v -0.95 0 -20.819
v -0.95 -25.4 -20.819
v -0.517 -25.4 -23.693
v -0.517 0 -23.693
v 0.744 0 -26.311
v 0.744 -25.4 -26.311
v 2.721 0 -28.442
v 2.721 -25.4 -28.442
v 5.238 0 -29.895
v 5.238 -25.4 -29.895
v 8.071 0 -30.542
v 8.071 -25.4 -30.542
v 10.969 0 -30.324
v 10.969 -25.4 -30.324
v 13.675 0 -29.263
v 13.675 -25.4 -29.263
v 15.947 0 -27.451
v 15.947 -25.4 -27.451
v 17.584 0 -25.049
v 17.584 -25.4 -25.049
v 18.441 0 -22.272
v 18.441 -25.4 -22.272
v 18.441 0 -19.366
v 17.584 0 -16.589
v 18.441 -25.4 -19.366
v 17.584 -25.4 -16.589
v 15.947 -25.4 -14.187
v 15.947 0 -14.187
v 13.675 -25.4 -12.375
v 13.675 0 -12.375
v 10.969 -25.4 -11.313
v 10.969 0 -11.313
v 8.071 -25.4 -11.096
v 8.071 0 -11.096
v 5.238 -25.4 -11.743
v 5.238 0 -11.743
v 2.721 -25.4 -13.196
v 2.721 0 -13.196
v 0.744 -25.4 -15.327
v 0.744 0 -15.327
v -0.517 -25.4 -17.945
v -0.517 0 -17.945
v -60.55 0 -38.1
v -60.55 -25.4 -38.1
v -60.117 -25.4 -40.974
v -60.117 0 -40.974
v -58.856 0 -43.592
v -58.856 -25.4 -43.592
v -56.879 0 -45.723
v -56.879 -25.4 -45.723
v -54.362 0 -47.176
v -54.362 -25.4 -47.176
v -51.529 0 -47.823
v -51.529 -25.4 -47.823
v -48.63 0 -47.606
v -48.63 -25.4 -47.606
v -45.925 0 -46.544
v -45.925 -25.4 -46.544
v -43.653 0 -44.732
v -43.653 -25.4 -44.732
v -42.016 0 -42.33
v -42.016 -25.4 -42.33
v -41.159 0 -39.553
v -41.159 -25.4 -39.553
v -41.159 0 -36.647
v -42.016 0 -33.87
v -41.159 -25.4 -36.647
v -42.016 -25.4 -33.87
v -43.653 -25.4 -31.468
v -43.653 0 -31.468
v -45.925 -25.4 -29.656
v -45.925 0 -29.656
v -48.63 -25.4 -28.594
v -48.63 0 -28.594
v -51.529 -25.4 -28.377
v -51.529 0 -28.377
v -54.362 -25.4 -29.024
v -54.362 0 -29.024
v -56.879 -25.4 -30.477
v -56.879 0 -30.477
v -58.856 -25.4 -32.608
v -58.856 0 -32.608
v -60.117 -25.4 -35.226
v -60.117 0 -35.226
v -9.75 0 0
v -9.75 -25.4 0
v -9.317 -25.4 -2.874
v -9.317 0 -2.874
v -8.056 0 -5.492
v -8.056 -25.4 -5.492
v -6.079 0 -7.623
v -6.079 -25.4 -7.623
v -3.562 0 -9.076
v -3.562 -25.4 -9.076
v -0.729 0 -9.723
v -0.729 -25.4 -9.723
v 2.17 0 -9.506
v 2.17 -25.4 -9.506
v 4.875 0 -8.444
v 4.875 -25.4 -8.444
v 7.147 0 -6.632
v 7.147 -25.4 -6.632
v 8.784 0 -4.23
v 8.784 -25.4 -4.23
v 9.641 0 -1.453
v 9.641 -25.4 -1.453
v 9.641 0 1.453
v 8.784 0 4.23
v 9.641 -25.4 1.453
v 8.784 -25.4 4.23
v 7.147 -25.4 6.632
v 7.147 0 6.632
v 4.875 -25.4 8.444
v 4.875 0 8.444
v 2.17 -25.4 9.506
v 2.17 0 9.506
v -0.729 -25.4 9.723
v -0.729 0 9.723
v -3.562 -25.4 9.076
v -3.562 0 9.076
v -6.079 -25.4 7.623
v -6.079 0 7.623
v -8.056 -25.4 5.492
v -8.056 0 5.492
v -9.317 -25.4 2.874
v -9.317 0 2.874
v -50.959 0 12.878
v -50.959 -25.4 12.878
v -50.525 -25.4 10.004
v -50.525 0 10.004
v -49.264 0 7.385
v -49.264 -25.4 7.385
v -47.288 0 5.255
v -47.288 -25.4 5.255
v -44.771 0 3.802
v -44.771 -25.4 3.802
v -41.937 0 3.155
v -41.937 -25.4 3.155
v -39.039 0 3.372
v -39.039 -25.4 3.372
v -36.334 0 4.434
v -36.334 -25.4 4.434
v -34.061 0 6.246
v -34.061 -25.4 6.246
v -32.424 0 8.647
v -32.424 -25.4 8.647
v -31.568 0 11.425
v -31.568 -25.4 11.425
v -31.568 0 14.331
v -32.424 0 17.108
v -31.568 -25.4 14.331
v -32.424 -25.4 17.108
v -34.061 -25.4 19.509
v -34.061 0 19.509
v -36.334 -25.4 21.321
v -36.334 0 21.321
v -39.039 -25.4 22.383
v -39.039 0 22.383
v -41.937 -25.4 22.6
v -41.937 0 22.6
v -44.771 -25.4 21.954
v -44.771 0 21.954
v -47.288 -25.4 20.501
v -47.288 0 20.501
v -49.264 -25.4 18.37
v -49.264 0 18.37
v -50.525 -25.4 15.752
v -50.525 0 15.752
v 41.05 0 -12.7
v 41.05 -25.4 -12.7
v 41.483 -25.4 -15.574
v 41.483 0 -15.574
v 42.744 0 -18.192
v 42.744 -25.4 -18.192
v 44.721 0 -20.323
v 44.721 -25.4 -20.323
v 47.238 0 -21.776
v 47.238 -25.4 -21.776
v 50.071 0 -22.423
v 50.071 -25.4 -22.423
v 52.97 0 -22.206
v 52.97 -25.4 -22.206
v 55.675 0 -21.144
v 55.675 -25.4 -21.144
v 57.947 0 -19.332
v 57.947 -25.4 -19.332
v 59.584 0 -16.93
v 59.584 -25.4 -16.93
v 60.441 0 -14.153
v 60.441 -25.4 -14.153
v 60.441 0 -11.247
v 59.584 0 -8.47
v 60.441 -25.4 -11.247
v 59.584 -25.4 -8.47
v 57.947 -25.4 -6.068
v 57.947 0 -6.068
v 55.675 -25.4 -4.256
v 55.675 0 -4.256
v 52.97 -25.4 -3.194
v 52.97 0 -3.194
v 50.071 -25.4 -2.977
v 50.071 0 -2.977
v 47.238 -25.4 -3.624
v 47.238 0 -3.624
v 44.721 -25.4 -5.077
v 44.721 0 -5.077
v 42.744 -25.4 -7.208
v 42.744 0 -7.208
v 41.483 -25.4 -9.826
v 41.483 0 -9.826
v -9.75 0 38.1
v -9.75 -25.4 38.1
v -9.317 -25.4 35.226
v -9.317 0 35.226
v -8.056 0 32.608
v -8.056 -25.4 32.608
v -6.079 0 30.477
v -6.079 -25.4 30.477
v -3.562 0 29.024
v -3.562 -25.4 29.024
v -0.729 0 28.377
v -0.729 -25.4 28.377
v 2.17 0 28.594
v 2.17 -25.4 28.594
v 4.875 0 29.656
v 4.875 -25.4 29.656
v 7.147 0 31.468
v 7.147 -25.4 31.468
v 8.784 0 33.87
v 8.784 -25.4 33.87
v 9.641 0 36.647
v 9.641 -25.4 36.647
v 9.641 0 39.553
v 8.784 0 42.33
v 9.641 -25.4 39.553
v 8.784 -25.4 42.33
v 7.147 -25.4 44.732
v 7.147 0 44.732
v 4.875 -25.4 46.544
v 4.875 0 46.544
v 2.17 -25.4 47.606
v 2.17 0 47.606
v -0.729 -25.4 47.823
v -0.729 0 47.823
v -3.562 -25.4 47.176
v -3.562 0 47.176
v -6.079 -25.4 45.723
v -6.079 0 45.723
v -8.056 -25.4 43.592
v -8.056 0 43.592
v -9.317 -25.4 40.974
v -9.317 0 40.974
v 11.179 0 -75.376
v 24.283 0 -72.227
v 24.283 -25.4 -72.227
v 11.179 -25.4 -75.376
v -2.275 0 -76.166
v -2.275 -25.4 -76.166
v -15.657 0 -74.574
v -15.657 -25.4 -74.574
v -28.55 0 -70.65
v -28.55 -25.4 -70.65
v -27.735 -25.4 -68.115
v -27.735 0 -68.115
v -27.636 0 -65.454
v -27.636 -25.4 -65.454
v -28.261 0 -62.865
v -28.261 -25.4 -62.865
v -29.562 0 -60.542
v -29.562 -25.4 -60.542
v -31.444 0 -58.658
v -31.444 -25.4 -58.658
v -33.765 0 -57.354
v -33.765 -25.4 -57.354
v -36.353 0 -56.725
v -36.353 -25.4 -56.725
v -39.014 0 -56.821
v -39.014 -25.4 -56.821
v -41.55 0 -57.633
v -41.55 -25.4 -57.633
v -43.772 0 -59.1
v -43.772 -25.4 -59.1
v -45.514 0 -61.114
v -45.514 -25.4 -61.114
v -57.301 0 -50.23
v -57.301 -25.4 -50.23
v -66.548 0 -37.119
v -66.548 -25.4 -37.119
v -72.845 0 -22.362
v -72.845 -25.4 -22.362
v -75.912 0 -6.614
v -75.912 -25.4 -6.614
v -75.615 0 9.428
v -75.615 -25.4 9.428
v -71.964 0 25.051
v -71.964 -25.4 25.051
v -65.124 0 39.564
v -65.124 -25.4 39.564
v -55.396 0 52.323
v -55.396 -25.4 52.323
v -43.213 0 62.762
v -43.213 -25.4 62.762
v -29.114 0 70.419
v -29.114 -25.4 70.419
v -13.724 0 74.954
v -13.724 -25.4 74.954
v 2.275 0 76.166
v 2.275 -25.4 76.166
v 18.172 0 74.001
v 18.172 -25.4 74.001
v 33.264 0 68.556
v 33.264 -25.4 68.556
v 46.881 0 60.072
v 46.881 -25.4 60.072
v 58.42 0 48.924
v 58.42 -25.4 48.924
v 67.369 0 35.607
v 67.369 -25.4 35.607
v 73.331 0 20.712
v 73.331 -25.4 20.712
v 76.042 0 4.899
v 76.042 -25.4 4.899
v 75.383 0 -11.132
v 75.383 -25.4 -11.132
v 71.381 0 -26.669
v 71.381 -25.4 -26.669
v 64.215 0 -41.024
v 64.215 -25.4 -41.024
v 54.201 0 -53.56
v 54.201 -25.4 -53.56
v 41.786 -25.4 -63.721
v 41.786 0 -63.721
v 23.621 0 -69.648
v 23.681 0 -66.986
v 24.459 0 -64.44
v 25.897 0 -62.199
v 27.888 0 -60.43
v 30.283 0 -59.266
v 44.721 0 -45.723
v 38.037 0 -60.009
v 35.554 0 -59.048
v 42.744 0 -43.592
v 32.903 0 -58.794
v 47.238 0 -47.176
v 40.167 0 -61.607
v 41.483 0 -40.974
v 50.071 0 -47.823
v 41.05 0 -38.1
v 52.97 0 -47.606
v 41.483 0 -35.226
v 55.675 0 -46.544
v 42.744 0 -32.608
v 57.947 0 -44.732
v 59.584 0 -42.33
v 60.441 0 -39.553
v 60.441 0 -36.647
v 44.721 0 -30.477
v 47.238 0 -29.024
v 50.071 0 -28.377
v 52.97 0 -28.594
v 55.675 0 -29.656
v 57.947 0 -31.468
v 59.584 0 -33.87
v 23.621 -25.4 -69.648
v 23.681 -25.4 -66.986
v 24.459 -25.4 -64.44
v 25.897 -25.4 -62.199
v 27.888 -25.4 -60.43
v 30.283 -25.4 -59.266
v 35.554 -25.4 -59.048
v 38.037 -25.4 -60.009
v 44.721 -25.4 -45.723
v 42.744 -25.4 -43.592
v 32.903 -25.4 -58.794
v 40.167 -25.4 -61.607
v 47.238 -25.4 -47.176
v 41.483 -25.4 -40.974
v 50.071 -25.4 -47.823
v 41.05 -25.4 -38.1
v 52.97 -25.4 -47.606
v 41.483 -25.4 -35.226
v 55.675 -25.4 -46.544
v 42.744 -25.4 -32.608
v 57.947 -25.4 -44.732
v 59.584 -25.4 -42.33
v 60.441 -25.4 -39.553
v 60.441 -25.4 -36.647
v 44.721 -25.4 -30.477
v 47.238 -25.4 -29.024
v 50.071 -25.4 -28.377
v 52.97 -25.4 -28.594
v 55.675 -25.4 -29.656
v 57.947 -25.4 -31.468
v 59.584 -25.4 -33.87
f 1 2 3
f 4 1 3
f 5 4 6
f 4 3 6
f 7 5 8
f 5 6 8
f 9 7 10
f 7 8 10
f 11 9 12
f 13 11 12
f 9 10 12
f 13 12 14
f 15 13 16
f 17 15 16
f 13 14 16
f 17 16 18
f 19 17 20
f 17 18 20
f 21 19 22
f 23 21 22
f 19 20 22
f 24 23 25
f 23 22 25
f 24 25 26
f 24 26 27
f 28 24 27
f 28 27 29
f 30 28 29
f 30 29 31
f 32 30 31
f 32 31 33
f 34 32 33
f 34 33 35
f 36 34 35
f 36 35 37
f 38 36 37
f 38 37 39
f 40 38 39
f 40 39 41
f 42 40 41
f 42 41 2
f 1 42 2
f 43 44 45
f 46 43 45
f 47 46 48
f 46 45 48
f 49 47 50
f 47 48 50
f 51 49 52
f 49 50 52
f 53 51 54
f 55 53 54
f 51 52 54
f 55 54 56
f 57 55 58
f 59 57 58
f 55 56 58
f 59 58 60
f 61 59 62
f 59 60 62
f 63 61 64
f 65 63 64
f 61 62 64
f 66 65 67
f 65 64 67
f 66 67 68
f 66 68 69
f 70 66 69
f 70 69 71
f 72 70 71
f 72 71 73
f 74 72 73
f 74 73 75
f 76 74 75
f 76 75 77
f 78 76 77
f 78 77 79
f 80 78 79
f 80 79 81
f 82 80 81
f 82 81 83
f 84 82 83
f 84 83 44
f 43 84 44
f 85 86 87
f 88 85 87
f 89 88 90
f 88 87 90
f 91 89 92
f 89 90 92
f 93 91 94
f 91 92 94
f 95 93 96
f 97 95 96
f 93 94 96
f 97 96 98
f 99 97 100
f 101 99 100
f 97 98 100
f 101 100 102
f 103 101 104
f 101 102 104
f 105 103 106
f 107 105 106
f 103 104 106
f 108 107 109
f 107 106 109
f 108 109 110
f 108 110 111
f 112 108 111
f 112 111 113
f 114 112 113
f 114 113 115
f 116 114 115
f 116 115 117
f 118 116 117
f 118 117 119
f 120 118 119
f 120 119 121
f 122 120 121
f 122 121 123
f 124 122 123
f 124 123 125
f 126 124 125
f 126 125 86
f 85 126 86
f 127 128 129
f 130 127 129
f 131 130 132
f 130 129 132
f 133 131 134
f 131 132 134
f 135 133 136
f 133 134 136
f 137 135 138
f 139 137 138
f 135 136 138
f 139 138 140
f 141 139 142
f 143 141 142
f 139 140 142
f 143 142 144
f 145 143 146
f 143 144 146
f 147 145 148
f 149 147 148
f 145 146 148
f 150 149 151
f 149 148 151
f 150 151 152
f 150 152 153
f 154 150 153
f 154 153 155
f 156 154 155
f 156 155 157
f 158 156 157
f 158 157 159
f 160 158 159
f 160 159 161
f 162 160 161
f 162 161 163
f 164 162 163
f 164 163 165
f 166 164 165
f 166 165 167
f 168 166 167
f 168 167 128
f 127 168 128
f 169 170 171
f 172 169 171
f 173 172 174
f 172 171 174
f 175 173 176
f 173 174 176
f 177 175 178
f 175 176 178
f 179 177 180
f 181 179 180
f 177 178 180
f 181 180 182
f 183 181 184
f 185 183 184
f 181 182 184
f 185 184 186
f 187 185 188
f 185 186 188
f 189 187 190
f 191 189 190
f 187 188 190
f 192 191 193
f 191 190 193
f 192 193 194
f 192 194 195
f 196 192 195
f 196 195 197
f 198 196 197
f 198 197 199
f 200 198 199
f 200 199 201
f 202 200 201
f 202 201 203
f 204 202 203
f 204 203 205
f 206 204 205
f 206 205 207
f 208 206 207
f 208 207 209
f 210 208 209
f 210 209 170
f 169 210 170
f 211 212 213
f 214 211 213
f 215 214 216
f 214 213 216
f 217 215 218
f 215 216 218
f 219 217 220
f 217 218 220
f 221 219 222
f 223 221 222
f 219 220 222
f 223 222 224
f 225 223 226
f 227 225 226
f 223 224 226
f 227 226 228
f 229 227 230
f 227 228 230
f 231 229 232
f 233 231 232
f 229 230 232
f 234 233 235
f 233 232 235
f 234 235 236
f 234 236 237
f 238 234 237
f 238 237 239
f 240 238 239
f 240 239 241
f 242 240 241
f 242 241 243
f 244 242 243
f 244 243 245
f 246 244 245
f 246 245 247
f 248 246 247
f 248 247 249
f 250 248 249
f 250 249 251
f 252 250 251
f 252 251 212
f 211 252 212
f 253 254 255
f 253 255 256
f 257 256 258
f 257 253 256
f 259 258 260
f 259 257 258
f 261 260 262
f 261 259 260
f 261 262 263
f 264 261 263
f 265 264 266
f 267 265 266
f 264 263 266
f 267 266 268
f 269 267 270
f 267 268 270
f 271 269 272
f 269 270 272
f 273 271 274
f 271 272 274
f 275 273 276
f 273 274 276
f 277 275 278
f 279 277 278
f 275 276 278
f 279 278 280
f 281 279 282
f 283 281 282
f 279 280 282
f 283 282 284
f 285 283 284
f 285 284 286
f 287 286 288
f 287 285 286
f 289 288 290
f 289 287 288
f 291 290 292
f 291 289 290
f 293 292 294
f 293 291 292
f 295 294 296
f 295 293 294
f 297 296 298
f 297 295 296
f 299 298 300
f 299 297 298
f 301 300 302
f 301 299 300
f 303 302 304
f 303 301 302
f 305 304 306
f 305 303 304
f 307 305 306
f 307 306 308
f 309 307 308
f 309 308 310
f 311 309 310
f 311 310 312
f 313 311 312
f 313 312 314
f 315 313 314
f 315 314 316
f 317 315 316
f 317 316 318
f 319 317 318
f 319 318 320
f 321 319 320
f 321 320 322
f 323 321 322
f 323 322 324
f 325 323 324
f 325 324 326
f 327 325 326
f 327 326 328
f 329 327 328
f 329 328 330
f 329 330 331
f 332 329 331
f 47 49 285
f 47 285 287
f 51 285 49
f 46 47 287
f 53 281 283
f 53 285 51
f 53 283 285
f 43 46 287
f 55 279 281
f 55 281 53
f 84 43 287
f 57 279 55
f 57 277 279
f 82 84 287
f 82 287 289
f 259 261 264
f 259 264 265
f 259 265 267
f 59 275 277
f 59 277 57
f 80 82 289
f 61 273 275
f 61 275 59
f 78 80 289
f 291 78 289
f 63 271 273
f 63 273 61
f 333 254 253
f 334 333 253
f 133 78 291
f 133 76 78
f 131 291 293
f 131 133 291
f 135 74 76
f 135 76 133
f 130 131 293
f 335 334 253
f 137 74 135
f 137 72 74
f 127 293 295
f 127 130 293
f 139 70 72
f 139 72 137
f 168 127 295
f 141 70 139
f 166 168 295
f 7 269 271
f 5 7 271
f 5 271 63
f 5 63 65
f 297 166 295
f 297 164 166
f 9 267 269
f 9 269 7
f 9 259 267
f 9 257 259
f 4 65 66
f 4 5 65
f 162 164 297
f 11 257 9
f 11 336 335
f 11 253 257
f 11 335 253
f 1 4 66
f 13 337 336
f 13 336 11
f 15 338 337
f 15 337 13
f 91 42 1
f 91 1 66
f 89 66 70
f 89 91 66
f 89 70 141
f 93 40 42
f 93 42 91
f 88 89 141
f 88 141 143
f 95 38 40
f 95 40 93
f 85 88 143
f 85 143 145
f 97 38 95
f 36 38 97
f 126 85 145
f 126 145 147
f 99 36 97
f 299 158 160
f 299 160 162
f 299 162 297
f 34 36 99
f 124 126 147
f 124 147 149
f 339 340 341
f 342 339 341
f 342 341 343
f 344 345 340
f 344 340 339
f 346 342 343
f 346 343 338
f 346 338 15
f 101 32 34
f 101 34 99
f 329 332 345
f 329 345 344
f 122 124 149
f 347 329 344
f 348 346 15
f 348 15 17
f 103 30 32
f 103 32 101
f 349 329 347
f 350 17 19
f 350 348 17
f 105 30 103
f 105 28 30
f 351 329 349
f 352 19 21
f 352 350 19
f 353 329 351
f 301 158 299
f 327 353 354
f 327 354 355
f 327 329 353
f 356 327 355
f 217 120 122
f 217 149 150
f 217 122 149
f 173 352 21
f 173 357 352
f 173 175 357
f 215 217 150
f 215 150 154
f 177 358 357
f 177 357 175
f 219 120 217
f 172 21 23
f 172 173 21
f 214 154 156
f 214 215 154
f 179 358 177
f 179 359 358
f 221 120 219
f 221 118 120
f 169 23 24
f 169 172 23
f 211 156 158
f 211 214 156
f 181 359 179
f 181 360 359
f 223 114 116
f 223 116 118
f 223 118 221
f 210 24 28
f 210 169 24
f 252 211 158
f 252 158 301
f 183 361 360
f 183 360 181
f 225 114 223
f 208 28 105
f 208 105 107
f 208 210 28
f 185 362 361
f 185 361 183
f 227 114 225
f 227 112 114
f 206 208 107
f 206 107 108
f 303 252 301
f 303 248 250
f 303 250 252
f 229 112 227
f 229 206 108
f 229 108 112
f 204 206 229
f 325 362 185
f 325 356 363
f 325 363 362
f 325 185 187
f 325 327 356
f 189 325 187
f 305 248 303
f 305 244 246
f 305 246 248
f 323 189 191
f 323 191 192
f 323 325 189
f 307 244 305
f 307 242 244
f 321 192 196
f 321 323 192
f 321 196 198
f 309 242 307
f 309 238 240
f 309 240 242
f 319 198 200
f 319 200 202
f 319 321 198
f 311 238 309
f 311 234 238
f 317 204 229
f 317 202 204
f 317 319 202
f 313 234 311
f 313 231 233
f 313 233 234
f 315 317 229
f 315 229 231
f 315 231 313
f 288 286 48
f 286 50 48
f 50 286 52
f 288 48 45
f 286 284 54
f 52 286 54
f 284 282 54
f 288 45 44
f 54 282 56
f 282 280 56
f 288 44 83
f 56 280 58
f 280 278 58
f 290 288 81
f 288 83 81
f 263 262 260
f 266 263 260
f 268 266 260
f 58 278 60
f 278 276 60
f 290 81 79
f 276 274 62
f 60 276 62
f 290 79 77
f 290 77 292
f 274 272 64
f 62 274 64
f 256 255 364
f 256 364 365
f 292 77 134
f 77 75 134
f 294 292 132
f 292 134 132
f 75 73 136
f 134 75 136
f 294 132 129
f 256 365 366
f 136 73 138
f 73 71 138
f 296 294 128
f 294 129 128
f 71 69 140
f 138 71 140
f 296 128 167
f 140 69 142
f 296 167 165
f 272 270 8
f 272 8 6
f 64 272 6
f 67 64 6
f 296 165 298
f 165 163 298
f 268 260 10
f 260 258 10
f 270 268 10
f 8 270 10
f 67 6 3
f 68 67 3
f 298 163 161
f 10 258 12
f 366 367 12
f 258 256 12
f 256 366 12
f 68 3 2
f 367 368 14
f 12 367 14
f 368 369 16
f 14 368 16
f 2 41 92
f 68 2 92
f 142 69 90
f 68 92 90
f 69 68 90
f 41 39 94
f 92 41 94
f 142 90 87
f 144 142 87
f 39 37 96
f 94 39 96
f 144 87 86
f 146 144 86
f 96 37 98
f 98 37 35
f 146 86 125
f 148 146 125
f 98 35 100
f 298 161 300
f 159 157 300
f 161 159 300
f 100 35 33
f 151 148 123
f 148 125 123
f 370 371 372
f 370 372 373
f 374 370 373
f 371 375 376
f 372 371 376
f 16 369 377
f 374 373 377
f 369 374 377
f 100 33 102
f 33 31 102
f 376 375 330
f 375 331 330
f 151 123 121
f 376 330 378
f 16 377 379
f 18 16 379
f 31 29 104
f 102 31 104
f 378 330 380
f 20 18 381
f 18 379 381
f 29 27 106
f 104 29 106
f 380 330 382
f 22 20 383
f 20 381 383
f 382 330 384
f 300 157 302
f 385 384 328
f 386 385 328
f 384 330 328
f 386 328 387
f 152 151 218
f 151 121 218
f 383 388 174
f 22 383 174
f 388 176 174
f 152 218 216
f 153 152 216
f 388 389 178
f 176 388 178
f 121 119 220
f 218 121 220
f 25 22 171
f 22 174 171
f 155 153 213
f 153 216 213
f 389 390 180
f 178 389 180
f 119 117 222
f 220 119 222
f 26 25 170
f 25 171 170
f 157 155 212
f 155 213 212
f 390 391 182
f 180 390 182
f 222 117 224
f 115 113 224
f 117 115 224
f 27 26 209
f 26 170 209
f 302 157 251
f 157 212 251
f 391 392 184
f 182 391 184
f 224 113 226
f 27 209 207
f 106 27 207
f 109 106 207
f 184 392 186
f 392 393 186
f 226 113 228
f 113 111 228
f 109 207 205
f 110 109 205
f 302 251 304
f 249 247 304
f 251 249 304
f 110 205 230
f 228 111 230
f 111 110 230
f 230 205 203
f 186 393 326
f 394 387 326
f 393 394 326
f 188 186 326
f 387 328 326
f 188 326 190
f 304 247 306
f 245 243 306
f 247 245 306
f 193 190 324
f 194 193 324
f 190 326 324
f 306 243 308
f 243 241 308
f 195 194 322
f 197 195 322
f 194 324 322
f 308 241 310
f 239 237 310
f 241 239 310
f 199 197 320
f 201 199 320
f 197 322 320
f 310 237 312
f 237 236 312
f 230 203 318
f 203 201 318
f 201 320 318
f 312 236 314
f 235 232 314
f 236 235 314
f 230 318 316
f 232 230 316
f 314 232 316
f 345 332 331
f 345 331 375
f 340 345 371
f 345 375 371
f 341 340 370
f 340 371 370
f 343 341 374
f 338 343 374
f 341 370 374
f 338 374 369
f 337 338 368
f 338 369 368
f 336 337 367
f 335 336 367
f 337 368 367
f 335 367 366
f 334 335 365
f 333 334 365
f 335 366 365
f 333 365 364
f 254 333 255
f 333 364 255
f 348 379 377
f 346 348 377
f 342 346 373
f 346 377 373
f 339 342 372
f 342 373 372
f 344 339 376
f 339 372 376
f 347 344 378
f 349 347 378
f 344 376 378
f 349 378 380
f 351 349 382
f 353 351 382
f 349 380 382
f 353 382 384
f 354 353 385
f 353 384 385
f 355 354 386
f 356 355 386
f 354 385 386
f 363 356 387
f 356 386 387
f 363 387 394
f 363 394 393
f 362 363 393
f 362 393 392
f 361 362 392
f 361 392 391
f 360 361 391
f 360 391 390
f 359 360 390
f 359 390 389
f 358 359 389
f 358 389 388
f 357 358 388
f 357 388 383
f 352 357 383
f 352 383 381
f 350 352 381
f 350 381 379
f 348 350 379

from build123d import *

# Parameters (mm, degrees)
SKETCH1_R              = 76.2
BOSS_EXTRUDE1_DEPTH    = 25.4
M22X2_5_TAPPED_HOLE1_D = 19.5


with BuildPart() as part:
    # Sketch1 → Boss-Extrude1 (new body)
    with BuildSketch(Plane(origin=(0, 0, 0), x_dir=(1, 0, 0), z_dir=(0, 1, 0))):
        with Locations(Location((0, 0, 0), (0, 0, 270))):
            Circle(SKETCH1_R)
    extrude(amount=-BOSS_EXTRUDE1_DEPTH)

    # M22x2.5 Tapped Hole1 (through all)
    with Locations(Plane(origin=(0, 0, 0), x_dir=(1, 0, 0), z_dir=(0, 1, 0))):
        with Locations((50.8, 12.7), (0, -38.1), (0, 0), (-50.8, 38.1), (50.8, 38.1), (-37.337291981, 66.425647362), (33.306888382, 68.535328016), (8.79976324, 20.818952057), (-41.20864737, -12.877702303)):
            Hole(M22X2_5_TAPPED_HOLE1_D / 2)


solid = part.part
